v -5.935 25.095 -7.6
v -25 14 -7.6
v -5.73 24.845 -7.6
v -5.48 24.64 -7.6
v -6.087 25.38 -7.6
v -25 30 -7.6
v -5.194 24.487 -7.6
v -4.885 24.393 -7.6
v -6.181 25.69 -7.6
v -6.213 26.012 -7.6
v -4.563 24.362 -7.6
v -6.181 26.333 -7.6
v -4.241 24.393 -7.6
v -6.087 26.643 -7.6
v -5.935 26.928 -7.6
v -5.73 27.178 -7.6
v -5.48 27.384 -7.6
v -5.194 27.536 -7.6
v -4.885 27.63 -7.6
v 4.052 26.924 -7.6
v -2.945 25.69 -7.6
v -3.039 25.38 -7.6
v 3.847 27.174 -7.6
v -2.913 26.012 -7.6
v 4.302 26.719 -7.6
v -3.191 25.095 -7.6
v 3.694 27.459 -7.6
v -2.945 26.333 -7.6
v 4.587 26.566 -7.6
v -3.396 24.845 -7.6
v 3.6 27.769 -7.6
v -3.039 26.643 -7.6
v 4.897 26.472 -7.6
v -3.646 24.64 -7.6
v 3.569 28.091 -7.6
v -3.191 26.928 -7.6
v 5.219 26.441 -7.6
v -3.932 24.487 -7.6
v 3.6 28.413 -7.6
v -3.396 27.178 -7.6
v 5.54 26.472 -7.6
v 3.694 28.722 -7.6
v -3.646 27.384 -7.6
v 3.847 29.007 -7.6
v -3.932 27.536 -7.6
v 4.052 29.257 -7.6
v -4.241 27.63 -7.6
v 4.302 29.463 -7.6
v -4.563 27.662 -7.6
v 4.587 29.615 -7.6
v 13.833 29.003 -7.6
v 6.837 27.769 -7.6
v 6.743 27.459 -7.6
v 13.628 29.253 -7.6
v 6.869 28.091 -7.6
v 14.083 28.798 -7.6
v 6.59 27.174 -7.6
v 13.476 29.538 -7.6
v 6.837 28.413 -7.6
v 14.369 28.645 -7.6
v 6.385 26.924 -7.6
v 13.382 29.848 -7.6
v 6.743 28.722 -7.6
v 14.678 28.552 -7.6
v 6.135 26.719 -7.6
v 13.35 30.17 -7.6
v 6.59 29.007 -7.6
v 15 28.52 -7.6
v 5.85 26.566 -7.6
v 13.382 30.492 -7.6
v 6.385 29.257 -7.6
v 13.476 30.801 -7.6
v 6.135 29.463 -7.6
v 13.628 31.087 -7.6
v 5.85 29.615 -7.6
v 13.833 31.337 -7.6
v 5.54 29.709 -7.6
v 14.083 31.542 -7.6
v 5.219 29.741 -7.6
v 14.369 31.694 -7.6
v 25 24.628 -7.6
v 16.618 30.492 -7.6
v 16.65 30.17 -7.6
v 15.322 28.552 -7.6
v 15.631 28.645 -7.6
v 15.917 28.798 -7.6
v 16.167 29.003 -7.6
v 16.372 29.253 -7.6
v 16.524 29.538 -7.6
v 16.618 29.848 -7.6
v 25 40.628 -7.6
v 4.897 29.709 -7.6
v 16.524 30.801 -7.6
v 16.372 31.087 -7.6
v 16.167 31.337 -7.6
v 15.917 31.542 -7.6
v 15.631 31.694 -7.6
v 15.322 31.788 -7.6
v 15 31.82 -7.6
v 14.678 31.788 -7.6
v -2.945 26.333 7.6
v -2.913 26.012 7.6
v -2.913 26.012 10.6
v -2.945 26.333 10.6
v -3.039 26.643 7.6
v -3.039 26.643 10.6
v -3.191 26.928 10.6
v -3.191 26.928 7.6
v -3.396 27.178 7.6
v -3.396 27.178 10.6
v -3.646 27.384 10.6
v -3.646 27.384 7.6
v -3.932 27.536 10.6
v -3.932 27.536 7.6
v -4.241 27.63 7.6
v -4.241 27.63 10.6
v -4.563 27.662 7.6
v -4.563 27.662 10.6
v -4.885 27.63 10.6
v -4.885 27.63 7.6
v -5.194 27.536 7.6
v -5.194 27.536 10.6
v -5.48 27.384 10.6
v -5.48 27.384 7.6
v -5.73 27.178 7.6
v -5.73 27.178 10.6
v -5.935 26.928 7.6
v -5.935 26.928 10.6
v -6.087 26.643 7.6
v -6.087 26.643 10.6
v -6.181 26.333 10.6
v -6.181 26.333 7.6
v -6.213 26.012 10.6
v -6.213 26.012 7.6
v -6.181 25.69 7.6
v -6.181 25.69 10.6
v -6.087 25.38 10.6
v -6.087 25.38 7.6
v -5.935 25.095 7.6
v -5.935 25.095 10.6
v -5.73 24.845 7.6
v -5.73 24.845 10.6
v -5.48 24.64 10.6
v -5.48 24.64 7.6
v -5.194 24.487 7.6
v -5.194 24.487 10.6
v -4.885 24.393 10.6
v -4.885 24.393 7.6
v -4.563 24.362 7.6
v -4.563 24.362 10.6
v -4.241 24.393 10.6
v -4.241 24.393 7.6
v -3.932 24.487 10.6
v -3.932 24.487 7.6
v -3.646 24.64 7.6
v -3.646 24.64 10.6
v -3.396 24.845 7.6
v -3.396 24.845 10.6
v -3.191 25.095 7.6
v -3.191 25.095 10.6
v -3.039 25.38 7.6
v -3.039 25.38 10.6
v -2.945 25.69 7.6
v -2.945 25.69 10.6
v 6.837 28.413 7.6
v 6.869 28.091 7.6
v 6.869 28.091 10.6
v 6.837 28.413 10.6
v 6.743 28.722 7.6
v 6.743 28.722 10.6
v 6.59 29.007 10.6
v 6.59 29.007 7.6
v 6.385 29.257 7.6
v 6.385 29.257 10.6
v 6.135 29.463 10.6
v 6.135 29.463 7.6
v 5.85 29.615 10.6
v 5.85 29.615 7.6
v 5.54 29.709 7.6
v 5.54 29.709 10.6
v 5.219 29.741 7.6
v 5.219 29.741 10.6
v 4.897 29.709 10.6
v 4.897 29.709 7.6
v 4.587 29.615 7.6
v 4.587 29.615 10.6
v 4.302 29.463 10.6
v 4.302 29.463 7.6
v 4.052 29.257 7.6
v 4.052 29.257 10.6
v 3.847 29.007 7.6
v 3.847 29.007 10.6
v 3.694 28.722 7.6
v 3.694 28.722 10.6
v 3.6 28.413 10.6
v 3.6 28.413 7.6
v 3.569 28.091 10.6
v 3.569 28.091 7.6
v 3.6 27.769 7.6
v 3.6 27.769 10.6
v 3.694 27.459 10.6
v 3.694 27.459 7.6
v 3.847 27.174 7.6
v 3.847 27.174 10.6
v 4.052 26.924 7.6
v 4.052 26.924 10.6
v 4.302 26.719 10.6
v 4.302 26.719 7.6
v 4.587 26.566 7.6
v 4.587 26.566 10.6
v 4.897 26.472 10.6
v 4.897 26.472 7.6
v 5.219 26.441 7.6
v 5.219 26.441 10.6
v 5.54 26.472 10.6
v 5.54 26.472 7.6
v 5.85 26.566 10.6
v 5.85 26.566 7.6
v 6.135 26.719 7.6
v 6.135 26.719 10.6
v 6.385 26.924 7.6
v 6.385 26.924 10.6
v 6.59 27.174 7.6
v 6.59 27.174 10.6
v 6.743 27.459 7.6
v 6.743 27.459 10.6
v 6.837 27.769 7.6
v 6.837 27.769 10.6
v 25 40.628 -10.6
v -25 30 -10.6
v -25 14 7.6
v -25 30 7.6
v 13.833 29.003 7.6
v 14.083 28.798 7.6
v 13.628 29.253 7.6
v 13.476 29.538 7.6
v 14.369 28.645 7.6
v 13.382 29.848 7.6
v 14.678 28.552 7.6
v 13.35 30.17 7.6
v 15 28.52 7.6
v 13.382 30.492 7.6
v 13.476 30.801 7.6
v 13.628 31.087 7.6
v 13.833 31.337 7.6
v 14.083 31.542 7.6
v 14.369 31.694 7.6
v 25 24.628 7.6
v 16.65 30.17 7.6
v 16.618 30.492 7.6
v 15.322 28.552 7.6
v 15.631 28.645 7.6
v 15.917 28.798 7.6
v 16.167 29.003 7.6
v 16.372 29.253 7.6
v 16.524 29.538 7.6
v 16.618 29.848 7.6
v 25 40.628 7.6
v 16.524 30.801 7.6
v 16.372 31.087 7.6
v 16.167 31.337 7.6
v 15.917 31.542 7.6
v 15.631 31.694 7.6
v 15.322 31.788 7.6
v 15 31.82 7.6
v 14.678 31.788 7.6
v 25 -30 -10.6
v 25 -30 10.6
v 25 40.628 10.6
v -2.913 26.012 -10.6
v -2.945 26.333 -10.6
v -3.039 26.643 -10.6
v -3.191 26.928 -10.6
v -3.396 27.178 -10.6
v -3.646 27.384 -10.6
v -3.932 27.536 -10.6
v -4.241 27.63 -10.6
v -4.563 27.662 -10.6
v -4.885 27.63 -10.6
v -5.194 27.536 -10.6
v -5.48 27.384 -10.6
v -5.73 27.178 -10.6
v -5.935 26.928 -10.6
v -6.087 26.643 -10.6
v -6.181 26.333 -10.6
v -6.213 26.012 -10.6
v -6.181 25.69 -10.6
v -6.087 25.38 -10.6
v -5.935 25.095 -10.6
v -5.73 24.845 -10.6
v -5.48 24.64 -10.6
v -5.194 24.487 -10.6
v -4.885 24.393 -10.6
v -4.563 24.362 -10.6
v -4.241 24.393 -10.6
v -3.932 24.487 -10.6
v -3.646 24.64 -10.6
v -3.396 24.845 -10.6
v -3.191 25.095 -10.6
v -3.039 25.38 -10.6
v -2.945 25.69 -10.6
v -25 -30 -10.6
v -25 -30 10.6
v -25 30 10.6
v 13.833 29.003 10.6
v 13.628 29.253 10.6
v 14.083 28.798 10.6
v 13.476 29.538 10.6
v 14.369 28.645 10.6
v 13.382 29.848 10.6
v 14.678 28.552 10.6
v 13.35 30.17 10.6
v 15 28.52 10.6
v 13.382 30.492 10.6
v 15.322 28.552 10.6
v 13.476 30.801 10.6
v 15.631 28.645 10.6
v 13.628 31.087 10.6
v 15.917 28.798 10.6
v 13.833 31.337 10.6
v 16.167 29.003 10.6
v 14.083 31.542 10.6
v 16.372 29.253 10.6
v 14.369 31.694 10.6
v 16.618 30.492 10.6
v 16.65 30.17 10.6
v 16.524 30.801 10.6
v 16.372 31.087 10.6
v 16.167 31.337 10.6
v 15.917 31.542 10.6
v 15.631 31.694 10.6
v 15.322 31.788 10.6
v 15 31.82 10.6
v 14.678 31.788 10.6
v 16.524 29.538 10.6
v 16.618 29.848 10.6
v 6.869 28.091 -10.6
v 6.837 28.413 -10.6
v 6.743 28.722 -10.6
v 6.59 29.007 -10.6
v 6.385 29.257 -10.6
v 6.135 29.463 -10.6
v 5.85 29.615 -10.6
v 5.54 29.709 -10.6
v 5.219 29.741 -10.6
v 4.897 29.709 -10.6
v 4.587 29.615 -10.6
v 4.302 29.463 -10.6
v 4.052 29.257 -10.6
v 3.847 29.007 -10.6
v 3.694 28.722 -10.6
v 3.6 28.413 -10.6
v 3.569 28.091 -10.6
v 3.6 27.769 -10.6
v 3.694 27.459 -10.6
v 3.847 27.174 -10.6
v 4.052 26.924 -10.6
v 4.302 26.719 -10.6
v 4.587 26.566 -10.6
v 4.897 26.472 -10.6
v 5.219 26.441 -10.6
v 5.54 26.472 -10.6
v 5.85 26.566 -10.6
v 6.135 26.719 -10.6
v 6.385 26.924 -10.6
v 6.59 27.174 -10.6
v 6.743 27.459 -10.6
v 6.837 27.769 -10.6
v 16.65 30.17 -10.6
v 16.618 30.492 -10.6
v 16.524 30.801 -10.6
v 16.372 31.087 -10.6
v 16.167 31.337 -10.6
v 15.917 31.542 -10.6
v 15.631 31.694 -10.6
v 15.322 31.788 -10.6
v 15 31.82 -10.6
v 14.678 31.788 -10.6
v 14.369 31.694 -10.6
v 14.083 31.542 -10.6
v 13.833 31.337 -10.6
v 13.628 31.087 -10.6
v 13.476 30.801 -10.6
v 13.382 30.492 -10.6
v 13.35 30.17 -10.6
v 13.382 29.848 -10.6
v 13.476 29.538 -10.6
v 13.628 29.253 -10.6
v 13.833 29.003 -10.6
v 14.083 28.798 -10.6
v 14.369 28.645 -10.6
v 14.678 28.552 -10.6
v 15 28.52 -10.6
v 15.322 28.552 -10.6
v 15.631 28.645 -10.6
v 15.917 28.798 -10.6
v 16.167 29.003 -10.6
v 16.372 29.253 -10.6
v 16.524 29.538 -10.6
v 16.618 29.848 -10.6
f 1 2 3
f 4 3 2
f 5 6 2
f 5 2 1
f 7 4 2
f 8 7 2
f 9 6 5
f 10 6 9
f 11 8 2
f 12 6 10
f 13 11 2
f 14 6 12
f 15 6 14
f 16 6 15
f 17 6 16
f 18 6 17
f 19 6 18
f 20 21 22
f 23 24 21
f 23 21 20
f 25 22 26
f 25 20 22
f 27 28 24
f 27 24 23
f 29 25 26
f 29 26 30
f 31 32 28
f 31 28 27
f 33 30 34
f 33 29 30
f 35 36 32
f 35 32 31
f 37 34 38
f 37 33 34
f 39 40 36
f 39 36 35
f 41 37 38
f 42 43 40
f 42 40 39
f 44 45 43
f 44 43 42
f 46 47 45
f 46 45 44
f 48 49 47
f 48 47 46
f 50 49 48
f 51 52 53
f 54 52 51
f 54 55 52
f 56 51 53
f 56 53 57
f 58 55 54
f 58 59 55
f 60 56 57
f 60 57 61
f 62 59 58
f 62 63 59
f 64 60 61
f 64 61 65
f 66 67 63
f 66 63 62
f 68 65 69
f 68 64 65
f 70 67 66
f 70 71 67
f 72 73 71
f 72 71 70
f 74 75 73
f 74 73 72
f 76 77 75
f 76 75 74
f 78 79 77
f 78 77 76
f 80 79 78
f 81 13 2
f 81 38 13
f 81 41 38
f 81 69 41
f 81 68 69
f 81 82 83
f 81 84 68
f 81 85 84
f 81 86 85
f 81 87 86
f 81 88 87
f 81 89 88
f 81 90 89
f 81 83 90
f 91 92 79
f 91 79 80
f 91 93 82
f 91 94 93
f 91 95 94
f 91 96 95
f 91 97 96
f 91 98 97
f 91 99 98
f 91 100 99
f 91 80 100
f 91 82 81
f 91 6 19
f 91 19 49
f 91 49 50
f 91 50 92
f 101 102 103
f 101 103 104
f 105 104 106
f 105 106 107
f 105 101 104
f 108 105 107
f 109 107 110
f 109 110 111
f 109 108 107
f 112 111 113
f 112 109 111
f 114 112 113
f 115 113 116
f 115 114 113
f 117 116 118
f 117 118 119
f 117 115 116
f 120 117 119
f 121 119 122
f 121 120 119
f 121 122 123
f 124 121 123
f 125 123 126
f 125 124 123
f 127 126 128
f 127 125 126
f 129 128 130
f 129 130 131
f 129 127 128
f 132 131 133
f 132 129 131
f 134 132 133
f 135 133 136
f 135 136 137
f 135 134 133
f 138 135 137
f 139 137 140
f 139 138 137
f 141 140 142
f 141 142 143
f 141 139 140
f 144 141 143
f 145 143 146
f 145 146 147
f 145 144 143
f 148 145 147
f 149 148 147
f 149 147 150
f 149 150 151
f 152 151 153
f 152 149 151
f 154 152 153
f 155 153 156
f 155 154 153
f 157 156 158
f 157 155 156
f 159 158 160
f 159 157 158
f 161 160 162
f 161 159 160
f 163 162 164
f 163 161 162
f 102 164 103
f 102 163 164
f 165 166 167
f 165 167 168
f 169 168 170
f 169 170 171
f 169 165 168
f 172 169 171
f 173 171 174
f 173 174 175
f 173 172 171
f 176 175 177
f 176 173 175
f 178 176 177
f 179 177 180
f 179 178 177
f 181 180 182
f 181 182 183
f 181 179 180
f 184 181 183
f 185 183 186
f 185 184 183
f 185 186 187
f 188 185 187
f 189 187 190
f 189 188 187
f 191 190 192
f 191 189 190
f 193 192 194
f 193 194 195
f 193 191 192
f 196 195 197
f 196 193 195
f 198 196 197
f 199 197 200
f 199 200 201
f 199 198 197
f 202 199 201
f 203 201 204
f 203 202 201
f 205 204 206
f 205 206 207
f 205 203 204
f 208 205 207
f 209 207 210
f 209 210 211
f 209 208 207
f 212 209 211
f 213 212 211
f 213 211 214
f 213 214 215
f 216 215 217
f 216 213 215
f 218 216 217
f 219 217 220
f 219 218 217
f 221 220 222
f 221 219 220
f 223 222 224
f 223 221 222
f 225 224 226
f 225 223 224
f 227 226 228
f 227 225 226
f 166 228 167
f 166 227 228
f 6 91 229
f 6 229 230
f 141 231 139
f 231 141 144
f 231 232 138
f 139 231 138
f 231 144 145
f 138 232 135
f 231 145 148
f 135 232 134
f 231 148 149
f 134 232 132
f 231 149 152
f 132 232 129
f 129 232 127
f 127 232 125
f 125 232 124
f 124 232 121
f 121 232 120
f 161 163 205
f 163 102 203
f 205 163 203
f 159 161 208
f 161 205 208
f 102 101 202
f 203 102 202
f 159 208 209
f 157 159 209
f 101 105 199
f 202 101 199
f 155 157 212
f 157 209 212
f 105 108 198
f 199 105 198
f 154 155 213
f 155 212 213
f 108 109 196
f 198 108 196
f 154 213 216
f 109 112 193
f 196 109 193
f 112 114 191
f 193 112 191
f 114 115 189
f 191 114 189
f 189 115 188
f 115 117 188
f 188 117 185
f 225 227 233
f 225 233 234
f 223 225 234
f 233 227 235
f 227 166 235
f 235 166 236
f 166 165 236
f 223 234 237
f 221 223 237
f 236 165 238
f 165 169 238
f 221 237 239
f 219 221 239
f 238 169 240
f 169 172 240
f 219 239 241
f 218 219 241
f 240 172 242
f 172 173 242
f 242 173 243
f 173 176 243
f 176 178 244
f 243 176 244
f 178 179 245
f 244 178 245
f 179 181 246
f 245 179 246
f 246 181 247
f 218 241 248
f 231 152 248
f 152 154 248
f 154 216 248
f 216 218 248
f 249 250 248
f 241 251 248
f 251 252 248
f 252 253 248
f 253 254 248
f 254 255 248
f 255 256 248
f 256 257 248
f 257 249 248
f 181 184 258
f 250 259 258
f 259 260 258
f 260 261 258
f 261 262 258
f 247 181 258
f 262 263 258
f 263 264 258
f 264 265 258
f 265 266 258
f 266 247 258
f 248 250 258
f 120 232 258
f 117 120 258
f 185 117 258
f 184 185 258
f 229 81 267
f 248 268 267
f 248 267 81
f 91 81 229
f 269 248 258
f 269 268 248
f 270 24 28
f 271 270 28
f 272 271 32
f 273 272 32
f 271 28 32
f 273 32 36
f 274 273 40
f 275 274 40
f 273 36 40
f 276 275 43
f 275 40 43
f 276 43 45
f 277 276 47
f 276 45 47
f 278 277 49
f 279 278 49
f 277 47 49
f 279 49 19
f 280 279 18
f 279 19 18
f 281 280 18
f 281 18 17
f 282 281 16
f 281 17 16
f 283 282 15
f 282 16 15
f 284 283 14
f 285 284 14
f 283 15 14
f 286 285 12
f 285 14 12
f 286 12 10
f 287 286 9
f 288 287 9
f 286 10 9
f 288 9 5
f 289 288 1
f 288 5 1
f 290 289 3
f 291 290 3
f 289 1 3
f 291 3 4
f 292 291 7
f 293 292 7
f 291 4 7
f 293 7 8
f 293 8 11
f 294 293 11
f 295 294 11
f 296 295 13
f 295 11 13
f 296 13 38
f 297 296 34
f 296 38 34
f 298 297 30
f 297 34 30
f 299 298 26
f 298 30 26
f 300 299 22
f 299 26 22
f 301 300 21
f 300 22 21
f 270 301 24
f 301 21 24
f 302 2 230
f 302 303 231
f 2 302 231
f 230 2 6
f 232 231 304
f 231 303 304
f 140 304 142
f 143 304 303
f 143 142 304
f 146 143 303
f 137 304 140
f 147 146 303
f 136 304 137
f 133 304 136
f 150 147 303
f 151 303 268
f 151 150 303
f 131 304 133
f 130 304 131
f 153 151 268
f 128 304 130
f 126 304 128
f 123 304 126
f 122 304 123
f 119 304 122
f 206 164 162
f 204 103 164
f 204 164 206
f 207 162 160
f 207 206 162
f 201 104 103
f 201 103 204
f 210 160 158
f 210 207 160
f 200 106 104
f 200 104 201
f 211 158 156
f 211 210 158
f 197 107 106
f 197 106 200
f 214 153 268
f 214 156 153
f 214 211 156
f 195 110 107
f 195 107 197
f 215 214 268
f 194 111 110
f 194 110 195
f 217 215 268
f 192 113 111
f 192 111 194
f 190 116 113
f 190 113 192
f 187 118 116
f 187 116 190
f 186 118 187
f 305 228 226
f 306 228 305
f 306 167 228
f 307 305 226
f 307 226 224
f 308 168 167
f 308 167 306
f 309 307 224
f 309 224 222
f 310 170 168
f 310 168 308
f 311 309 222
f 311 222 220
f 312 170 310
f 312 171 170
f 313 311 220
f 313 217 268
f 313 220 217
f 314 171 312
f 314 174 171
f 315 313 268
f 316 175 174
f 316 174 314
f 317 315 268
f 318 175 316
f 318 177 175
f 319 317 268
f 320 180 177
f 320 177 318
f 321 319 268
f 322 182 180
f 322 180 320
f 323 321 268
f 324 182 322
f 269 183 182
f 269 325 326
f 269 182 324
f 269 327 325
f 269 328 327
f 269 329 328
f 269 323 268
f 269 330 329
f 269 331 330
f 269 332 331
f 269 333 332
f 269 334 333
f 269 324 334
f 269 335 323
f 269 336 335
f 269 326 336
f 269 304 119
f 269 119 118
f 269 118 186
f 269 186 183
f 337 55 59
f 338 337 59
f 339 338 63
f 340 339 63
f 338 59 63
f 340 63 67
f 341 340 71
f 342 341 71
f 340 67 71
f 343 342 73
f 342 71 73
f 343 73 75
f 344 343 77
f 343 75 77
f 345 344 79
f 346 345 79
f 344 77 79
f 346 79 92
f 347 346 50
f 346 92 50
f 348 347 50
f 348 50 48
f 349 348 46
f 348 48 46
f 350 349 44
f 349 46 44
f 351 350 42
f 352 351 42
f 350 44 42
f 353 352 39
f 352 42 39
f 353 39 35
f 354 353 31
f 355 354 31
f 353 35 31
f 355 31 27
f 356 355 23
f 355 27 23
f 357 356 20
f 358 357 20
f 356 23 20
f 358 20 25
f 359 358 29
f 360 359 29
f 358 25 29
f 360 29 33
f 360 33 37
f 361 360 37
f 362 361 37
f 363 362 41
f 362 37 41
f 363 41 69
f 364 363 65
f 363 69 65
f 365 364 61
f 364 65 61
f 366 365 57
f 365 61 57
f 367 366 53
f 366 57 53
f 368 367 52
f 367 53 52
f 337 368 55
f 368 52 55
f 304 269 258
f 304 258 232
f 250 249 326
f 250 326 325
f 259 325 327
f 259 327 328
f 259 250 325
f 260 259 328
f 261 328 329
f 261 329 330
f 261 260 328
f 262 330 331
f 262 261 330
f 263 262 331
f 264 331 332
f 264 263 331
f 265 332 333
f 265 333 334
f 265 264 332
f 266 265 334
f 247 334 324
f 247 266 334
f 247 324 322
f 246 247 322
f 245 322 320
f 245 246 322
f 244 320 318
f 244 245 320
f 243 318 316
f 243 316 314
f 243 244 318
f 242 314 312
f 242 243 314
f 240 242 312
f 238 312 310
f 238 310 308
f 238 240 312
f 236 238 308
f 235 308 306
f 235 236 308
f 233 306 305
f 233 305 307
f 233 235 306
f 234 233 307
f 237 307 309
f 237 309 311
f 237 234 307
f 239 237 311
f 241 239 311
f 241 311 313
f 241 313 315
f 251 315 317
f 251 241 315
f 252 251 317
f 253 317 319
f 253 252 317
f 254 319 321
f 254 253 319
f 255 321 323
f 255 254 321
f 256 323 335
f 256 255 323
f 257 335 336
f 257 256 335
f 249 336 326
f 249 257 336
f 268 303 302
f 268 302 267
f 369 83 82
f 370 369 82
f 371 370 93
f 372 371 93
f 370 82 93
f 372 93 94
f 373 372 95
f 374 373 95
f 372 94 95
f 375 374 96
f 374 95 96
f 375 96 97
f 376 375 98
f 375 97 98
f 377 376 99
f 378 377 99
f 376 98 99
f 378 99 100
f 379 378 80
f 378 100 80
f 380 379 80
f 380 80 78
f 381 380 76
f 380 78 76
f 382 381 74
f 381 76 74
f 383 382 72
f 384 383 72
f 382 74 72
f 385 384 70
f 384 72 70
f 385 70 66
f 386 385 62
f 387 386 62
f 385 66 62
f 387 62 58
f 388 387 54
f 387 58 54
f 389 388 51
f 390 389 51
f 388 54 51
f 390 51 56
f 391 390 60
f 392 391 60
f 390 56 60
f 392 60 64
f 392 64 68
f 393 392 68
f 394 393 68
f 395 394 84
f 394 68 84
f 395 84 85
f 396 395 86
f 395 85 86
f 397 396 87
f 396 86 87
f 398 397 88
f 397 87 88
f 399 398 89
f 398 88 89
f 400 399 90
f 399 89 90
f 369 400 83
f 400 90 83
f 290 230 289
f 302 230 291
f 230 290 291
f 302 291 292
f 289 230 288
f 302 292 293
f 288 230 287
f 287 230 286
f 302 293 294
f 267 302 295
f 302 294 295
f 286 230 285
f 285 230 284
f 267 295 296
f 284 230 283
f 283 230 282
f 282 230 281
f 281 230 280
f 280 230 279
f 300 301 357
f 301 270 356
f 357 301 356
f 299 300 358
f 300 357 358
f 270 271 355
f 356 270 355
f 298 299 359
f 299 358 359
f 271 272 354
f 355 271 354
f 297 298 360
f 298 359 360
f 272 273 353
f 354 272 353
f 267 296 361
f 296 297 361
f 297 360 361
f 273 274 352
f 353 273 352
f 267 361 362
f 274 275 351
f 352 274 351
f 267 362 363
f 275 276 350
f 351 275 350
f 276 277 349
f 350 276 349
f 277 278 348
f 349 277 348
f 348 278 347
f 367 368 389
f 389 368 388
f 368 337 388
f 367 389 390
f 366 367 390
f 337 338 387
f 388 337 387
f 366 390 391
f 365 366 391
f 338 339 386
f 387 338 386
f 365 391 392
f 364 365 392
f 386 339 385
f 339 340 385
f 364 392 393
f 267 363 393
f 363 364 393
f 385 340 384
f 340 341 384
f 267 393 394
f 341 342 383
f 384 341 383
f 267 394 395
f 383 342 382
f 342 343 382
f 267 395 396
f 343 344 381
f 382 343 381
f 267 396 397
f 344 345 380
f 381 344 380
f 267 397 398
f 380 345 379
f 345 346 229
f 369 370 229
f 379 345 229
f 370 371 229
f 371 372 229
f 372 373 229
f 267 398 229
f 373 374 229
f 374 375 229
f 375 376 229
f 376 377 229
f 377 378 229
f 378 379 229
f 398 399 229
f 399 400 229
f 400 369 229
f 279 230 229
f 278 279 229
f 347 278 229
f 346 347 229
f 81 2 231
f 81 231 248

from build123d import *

# Parameters (mm, degrees)
SKETCH_1_W          = 50
SKETCH_1_H          = 60
EXTRUDE_1_DEPTH     = 10.6
EXTRUDE_2_DEPTH     = 3
EXTRUDE_START       = -18.2
EXTRUDE_3_DEPTH     = 3
SKETCH_3_W          = 15.2
SKETCH_3_H          = 16
SKETCH_4_R          = 1.65
CUT_EXTRUDE_1_DEPTH = 3


with BuildPart() as part:
    # 草图1 → 凸台-拉伸1 (new, symmetric)
    with BuildSketch(Plane.XY):
        Rectangle(SKETCH_1_W, SKETCH_1_H)
    extrude(amount=EXTRUDE_1_DEPTH, both=True)

    # 草图2 → 凸台-拉伸2 (add)
    with BuildSketch(Plane.XY.offset(10.6)):
        Polygon((-25, 30), (25, 30), (25, 40.627828084), align=None)
    extrude(amount=-EXTRUDE_2_DEPTH)

    # 草图2<2> → 凸台-拉伸3 (add)
    with BuildSketch(Plane.XY.offset(10.6).offset(EXTRUDE_START)):
        Polygon((-25, 30), (25, 30), (25, 40.627828084), align=None)
    extrude(amount=-EXTRUDE_3_DEPTH)

    # 切除-扫描1: sweep along a curve in space
    with BuildLine() as sweep_1_path:
        Line((25, 40.627828084, 10.6), (-25, 30, 10.6))
    # 草图3 → 切除-扫描1 (sweep, cut)
    with BuildSketch(Plane.ZY.offset(25)):
        with Locations((0, 22)):
            Rectangle(SKETCH_3_W, SKETCH_3_H)
    sweep(path=sweep_1_path.line, mode=Mode.SUBTRACT)

    # 草图4 → 切除-拉伸1 (cut)
    with BuildSketch(Plane.XY.offset(-7.6)):
        with Locations((-4.562952015, 26.011583112)):
            Circle(SKETCH_4_R)
        with Locations((5.218523993, 28.09070002)):
            Circle(SKETCH_4_R)
        with Locations((15, 30.169816928)):
            Circle(SKETCH_4_R)
    cut_extrude_1 = extrude(amount=-CUT_EXTRUDE_1_DEPTH, mode=Mode.SUBTRACT)

    # 镜向1: 切除-拉伸1 across plane
    add(cut_extrude_1.mirror(Plane.XY), mode=Mode.SUBTRACT)


solid = part.part
